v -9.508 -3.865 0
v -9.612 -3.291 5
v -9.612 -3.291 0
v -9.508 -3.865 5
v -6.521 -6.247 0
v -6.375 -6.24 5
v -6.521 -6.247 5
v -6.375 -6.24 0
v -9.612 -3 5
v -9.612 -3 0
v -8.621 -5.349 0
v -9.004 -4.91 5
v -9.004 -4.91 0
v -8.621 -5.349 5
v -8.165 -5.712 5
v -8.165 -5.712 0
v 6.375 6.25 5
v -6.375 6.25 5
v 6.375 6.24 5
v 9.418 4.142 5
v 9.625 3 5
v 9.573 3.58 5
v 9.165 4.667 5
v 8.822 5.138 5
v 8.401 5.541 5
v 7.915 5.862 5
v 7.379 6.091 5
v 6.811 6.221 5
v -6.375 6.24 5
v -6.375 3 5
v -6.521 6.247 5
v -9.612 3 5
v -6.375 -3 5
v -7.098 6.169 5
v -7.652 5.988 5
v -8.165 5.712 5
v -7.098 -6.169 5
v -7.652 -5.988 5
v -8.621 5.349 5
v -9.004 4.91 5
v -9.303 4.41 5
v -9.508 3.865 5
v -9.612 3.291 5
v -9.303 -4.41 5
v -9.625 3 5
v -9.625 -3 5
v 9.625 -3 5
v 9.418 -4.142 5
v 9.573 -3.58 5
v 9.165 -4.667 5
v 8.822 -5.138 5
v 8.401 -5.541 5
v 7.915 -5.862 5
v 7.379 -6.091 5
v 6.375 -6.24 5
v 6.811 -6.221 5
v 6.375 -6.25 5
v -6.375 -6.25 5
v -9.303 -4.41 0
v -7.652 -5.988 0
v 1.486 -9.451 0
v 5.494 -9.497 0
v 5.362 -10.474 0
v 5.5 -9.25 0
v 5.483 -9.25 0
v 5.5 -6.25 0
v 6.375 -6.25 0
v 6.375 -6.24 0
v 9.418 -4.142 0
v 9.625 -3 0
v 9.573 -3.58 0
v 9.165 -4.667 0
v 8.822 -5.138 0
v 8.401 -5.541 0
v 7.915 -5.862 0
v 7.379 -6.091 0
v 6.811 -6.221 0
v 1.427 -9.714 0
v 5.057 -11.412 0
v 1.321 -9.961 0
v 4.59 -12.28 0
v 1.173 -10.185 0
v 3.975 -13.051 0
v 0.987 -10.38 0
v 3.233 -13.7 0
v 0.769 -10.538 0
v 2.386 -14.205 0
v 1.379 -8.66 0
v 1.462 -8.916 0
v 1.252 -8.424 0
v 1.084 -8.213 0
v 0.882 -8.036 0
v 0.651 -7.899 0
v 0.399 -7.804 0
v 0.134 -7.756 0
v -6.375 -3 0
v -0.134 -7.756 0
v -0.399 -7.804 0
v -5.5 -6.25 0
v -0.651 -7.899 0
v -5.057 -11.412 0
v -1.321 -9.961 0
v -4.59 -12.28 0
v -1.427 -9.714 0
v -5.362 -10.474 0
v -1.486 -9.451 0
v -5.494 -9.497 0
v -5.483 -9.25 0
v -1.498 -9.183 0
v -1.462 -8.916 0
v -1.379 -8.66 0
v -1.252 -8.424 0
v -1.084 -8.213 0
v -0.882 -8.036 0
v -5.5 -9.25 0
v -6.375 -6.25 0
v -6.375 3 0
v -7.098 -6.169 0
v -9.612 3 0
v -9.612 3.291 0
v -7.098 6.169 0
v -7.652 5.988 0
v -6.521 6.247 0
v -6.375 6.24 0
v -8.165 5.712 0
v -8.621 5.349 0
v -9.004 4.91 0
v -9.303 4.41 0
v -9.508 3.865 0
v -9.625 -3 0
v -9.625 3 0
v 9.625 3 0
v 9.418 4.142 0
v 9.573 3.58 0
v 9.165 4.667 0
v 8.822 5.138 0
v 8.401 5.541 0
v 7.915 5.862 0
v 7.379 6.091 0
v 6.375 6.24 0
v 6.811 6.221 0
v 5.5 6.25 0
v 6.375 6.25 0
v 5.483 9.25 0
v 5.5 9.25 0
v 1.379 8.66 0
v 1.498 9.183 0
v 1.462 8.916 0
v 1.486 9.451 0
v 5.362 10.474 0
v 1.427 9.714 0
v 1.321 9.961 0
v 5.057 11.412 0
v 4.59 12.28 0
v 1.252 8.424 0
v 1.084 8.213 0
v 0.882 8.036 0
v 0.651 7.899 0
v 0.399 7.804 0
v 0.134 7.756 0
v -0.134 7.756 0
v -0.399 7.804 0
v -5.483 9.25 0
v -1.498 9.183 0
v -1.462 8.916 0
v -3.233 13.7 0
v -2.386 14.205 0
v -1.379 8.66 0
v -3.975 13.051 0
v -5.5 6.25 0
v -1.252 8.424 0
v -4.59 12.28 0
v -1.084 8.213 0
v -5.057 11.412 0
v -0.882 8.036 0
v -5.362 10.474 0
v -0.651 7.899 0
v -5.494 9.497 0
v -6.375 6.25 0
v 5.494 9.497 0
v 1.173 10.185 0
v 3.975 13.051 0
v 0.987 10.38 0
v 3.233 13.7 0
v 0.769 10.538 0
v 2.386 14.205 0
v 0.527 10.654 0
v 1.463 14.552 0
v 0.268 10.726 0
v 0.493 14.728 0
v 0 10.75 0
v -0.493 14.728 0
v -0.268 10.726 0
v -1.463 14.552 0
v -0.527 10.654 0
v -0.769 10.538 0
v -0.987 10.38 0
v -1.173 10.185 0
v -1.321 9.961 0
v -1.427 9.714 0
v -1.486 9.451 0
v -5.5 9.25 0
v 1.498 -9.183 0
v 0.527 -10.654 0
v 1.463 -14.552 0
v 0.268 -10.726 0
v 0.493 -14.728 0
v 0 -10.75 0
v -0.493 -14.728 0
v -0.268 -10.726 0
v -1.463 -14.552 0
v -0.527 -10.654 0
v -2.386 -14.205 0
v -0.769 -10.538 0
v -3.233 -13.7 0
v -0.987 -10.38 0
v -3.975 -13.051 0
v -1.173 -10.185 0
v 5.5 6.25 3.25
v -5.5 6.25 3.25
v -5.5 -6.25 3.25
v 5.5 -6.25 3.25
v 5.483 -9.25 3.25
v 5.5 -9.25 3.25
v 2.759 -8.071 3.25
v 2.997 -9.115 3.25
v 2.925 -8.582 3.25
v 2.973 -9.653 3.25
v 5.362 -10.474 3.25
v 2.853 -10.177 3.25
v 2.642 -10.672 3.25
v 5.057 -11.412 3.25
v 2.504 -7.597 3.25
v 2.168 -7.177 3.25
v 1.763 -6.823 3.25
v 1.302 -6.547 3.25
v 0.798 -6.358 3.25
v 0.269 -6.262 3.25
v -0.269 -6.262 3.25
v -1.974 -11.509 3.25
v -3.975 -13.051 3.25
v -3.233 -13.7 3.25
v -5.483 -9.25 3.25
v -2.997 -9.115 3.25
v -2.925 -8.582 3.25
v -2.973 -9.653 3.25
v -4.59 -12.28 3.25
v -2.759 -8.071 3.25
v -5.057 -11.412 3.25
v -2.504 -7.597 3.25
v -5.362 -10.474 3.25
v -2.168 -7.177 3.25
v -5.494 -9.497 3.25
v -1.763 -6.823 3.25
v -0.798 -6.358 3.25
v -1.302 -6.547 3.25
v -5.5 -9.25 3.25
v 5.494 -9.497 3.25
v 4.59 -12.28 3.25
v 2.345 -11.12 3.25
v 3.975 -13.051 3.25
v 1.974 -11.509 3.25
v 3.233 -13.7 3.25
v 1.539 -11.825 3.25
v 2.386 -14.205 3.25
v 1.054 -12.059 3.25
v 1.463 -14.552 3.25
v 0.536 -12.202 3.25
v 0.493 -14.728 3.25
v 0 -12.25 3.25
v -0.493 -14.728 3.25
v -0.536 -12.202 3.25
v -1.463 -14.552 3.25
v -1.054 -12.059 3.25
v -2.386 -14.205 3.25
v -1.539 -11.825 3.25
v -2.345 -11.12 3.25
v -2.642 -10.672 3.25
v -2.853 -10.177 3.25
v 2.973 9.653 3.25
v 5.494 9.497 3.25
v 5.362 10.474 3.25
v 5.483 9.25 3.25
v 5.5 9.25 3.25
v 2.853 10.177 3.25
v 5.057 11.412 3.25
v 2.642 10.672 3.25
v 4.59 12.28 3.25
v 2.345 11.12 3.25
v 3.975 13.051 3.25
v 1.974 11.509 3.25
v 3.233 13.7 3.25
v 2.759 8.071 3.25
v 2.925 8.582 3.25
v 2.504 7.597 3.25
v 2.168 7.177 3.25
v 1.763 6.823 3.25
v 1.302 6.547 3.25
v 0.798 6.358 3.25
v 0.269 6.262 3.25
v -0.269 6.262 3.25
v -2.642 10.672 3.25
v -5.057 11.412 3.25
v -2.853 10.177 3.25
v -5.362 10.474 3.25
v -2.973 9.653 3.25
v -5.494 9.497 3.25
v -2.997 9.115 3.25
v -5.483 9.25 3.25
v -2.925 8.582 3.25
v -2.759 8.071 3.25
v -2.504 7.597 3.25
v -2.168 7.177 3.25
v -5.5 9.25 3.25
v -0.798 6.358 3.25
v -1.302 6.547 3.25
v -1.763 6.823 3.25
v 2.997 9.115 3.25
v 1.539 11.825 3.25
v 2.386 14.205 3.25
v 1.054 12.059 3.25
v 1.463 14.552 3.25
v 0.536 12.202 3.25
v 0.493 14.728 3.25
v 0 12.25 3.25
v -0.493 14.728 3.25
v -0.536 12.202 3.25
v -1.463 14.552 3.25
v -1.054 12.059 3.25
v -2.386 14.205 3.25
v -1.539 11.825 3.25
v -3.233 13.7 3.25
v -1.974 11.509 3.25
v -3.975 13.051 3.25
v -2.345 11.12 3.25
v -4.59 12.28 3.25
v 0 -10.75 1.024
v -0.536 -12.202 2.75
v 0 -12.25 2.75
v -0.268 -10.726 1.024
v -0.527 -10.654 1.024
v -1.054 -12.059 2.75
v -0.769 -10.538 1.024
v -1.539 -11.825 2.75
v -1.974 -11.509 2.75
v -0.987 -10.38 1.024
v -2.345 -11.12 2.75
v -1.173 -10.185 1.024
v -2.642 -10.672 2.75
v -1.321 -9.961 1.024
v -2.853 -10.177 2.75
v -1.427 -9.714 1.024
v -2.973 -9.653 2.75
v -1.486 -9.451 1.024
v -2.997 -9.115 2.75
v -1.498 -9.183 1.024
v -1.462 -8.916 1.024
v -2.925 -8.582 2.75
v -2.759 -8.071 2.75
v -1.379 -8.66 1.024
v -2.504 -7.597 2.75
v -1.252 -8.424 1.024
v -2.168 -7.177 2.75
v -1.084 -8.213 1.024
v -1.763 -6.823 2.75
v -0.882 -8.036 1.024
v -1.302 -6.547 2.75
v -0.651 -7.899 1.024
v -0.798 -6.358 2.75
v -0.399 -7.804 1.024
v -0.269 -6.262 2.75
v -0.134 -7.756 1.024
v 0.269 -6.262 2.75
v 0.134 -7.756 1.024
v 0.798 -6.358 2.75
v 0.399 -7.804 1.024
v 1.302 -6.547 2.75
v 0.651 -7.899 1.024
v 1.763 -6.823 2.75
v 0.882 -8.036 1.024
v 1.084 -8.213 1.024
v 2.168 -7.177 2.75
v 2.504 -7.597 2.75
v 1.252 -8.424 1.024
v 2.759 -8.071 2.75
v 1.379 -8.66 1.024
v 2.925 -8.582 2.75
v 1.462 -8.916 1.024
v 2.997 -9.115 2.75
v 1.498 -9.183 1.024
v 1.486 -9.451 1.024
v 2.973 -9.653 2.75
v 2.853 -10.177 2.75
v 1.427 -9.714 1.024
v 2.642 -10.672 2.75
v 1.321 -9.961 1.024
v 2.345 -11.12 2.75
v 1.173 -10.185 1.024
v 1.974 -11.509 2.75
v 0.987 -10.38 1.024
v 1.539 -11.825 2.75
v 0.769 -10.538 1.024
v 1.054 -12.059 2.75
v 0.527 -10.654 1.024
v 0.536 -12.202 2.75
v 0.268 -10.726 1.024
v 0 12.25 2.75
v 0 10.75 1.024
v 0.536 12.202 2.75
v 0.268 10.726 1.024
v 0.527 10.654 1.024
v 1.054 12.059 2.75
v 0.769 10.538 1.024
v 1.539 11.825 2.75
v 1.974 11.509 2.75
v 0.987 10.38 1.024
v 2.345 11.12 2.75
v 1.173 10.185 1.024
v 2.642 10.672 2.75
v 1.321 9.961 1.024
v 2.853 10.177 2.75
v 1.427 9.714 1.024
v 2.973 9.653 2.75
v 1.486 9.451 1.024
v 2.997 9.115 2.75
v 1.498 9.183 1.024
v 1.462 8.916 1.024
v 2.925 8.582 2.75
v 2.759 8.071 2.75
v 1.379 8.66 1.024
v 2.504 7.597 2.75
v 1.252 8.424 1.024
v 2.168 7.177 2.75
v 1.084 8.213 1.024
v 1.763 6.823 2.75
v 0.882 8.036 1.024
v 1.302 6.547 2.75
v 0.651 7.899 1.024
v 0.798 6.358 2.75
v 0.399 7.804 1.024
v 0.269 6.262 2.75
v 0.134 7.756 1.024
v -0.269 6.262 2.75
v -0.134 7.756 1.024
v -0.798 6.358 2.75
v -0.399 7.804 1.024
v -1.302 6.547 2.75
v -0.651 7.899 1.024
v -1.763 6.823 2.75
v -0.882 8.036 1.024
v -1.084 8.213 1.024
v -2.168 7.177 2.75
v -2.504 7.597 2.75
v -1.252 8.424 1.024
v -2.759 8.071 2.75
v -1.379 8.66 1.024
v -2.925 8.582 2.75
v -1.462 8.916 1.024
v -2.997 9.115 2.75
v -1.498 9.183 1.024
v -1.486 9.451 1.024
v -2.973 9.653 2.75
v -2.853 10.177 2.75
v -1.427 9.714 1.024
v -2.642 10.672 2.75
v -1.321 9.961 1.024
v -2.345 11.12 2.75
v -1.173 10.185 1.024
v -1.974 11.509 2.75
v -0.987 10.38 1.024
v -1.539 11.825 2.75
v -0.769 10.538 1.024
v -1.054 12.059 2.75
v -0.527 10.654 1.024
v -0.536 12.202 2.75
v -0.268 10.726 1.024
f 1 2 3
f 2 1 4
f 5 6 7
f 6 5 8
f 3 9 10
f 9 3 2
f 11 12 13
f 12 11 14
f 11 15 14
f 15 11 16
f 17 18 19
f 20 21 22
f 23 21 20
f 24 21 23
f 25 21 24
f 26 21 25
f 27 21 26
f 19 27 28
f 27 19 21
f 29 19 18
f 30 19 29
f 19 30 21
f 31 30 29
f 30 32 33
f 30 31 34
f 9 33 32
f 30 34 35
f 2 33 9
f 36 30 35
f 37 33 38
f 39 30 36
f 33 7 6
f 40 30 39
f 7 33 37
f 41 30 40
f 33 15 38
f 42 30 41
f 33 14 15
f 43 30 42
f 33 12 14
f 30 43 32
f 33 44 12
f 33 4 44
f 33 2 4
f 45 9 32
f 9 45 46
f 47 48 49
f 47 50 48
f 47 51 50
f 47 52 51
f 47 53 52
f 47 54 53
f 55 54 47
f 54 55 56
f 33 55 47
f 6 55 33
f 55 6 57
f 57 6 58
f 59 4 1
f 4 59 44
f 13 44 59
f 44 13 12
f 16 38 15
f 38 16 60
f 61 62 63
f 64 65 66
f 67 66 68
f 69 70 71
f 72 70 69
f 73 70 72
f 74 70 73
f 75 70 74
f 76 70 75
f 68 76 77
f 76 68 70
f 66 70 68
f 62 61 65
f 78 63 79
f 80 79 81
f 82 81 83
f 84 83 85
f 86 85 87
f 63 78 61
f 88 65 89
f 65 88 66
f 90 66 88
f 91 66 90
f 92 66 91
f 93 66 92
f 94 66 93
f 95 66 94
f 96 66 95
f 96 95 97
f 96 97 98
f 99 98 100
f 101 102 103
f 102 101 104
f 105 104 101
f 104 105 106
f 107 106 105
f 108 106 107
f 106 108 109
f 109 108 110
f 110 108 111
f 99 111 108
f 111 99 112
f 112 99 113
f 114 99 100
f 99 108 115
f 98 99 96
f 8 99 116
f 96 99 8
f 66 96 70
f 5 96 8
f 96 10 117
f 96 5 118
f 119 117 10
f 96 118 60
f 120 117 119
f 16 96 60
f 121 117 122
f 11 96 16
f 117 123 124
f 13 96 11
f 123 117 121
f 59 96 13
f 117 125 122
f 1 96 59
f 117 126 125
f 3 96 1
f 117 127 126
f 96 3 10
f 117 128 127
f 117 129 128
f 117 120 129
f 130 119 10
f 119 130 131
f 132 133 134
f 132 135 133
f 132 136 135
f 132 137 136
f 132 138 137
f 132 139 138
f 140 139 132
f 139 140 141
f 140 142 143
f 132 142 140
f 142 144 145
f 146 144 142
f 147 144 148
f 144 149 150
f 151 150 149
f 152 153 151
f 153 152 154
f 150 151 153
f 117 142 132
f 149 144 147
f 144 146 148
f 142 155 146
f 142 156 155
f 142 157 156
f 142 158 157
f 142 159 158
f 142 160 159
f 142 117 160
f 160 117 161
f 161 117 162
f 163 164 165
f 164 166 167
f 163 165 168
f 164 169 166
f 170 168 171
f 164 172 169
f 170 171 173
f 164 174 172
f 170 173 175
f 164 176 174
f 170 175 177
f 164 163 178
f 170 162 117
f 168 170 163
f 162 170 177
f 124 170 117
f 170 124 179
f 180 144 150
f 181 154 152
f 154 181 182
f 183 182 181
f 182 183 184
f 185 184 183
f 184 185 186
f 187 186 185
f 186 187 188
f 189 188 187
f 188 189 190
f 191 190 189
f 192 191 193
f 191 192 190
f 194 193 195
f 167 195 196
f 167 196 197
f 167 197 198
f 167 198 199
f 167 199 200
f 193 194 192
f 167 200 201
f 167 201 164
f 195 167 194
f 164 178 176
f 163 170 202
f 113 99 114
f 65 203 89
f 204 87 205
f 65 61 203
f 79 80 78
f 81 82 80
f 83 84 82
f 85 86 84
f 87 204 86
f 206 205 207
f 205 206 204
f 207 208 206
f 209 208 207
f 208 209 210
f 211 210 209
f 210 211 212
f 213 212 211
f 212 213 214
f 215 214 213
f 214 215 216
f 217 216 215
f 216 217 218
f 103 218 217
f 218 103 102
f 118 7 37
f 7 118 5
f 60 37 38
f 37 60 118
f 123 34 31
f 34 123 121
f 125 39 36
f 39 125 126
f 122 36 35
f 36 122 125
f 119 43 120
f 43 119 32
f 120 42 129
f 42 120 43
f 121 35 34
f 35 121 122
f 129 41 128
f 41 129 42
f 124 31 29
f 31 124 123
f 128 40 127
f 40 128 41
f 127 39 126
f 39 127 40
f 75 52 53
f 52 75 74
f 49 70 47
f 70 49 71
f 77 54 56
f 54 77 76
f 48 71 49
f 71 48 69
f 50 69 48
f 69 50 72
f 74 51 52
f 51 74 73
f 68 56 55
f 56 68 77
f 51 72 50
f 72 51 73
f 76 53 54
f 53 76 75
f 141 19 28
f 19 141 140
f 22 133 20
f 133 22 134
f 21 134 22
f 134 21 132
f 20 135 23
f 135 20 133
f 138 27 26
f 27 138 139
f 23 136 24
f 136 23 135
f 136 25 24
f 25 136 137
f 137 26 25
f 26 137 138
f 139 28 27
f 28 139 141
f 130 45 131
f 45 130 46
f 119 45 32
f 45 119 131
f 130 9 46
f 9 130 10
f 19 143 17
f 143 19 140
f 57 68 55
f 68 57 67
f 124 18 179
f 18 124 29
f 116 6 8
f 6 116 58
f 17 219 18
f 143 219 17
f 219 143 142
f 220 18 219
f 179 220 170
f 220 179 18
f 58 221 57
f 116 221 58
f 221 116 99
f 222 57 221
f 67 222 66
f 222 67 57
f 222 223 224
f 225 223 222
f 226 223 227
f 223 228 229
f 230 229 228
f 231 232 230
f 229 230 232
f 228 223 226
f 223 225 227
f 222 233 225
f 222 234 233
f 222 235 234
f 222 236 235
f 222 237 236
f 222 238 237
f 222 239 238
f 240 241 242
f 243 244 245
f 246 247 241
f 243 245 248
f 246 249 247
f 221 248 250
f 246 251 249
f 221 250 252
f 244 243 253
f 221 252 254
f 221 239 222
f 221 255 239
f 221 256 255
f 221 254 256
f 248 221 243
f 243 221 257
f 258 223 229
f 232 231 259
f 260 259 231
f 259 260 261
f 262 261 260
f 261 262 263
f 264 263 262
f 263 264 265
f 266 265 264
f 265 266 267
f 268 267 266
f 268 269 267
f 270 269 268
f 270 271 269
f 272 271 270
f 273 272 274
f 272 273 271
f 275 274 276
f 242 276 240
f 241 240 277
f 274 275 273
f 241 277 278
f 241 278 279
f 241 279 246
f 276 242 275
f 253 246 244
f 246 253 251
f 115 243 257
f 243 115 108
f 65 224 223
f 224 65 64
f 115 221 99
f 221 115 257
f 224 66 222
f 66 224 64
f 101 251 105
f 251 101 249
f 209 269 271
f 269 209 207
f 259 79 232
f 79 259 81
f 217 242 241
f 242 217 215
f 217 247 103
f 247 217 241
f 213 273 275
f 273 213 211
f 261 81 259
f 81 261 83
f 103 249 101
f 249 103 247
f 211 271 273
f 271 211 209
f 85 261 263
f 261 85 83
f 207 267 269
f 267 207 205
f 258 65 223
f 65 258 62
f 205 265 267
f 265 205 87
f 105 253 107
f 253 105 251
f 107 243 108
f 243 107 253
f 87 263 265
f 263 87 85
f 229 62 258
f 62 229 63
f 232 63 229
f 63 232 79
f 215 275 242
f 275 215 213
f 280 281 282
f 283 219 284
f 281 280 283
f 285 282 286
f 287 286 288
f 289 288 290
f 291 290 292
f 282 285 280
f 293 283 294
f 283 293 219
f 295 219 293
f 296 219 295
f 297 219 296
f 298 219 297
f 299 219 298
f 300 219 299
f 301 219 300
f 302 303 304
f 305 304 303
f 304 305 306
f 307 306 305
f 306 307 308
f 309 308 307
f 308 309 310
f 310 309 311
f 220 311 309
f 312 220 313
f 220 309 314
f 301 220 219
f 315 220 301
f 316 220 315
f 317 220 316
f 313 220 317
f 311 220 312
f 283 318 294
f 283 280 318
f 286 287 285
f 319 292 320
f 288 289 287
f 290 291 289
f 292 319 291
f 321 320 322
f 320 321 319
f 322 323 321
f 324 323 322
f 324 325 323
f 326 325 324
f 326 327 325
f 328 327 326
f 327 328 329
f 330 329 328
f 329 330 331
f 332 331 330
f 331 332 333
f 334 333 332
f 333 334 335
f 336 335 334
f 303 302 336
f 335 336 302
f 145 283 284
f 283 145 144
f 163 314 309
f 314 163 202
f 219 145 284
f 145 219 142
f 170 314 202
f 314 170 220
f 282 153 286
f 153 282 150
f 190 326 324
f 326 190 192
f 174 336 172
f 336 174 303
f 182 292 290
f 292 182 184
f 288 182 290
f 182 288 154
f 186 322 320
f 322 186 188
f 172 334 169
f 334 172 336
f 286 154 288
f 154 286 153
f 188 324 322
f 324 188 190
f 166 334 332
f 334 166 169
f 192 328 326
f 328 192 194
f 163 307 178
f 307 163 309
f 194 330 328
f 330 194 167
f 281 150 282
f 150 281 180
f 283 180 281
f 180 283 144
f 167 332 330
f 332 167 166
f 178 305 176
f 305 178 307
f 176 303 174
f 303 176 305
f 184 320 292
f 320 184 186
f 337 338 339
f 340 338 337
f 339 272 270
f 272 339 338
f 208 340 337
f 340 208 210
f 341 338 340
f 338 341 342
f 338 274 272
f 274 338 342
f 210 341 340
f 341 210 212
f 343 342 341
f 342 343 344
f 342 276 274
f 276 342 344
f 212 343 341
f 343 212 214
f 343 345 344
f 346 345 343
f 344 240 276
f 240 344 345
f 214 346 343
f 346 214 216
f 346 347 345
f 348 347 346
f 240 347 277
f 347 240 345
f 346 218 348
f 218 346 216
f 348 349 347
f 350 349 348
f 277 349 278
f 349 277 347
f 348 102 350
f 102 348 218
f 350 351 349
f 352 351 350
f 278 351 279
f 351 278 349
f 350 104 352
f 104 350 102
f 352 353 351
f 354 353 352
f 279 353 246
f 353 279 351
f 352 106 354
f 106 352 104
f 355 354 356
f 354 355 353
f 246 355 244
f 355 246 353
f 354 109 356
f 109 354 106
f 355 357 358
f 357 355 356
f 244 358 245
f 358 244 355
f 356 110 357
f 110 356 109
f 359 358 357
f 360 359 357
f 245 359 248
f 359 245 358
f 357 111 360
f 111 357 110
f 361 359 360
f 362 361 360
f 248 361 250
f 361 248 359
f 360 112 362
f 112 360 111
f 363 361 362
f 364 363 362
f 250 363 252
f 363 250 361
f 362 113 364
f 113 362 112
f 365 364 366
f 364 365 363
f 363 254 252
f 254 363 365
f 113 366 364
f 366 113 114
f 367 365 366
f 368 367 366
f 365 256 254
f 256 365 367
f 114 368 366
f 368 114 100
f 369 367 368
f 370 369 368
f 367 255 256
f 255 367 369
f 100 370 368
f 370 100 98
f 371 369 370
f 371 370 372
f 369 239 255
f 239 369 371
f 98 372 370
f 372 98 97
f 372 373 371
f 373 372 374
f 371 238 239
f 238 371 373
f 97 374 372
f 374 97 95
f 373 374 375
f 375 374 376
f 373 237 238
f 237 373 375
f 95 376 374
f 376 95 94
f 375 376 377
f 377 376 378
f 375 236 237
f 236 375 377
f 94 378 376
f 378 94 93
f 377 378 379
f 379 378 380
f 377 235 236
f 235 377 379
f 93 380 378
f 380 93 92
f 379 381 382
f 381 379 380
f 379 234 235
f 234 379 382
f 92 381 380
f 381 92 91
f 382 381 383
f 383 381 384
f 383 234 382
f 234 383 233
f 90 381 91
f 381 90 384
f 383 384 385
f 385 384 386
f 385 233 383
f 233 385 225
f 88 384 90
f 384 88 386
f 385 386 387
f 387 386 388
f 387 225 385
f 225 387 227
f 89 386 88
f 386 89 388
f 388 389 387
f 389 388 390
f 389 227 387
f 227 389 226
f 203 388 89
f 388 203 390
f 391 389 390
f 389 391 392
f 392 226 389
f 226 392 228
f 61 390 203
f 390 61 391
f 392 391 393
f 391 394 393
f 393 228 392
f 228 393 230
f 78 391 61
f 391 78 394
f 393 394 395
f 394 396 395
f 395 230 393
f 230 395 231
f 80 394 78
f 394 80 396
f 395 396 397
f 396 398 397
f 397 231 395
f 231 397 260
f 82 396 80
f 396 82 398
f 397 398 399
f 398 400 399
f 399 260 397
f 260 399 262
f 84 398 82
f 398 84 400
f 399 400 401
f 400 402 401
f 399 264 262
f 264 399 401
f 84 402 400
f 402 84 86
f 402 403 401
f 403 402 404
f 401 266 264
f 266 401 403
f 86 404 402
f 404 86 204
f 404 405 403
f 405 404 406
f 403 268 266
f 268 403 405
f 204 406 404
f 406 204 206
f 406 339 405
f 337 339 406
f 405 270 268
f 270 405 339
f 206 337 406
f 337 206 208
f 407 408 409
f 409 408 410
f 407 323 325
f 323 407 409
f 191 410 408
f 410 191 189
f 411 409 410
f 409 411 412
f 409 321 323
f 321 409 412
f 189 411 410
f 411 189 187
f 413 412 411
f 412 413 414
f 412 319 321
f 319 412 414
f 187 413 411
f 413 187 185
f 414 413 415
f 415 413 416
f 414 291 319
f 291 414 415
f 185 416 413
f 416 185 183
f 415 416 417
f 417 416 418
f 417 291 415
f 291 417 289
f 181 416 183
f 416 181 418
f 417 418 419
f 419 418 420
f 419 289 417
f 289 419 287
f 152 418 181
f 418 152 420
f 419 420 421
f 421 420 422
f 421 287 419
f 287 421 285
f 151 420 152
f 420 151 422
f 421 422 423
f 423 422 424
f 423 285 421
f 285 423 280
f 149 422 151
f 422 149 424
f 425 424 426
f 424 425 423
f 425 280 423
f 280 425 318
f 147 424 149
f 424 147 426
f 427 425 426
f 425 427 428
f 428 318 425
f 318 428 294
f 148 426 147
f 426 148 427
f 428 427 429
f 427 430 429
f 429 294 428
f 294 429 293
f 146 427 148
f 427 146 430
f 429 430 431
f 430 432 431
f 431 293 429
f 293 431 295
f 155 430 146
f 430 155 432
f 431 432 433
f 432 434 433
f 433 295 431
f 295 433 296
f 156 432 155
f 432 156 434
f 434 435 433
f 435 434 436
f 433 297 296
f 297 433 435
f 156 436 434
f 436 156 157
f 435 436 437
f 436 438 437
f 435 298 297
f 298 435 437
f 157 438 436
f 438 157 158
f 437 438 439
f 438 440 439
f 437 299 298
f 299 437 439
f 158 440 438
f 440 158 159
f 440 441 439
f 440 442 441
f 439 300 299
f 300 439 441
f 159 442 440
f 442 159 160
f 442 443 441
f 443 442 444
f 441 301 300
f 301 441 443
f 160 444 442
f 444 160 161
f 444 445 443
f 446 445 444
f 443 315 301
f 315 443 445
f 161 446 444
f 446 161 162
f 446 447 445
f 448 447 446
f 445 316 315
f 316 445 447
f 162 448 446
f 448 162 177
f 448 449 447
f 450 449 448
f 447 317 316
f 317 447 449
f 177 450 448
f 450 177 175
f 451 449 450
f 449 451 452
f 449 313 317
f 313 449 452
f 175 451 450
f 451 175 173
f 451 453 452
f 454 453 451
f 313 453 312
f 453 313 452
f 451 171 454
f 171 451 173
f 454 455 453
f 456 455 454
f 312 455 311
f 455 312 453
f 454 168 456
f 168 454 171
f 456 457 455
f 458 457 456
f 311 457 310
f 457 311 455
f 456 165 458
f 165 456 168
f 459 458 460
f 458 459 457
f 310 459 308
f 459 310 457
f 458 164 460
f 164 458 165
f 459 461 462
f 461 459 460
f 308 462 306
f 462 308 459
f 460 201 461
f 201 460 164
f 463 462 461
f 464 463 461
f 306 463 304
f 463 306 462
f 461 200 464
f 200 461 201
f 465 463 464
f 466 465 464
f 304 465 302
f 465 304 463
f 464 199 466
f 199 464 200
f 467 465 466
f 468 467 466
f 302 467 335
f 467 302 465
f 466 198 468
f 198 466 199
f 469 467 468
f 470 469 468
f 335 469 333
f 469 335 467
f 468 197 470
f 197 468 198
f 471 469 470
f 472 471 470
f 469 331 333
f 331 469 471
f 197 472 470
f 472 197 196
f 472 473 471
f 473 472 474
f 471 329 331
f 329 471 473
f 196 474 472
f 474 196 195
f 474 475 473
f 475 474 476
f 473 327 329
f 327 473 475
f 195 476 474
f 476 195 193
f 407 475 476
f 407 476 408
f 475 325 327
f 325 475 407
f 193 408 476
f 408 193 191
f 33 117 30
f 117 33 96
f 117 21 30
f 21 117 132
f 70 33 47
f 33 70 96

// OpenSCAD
/*
 * Board Anchor (Parametric), v0.42
 *
 * by Alex Franke (CodeCreations), Dec 2012
 * http://www.theFrankes.com
 * 
 * Licenced under Creative Commons Attribution - Non-Commercial - Share Alike 3.0 
 * 
 * DESCRIPTION: Serves to anchor a board (such as the foot of a laser-cut printer) vertically. 
 * 
 * INSTRUCTIONS:  Print an anchor for each end to be anchored, then install with the board in place
 *   if possible. 
 * 
 * v0.42, Dec 28, 2012: Initial Release.
 * 
 * TODO: 
 *   * None at this time. 
 */


/////////////////////////////////////////////////////////////////////////////
// User-defined values... 
/////////////////////////////////////////////////////////////////////////////

thickness      = 3.25; // Thickness of the printed material 
anchorLength   = 16;   // Length of board edge to "wrap" in the anchor 
anchorHeight   = 5;    // Height of anchor portion  
boardThickness = 6;    // Thickness of the board to anchor

shaftDiameter  = 3;    // The diameter of the through-hole for the screw. #6=3.58, #4=2.78
headDiameter   = 6;    // The diameter of the head of the screw. #6=7.14, #4=5.95
holePadding    = 2.5;  // The width of the material around the hole 
screwAngle     = 82;   // Countersink angle (angle of screw head -- 82 is pretty standard for wood 
                       //   screws.) Other common countersink angles are 60, 90, 100, 110, and 120. 

counterSink    = 0.5;  // Additional distance to inset the countersink

$fn            = 35;   // General curve quality


/////////////////////////////////////////////////////////////////////////////
// The code...
/////////////////////////////////////////////////////////////////////////////

yHeight = (headDiameter/2-shaftDiameter/2)/tan(screwAngle/2); 

difference() {
	union() {
		roundedBox([anchorLength+thickness,boardThickness+thickness*2,anchorHeight],thickness);

		for(y=[-1,1]) 
			translate([0,(boardThickness/2+thickness+headDiameter/2)*y,0]) 
				rotate(y*-90) 
					bracket(headDiameter/2,shaftDiameter/2,headDiameter/2,holePadding,thickness);
	}

	// remove the board 
	translate([-(anchorLength+thickness)/2+thickness,-boardThickness/2,-0.5]) 
		cube([anchorLength+1,boardThickness,anchorHeight+1]);

	// Remove the screw holes 
	for(y=[-1,1]) 
		translate([0,(boardThickness/2+thickness+headDiameter/2)*y,-counterSink]) 
			rotate(y*-90) 
				bracketHole(shaftDiameter/2,headDiameter/2,screwAngle,thickness);
}


/////////////////////////////////////////////////////////////////////////////
// Modules...
/////////////////////////////////////////////////////////////////////////////

module roundedBox(size, radius) {
	union() {
		for(x=[-1,1],y=[-1,1]) 
			translate([x*(size[0]-radius*2)/2,y*(size[1]-radius*2)/2,0]) 
				cylinder(h=size[2],r=radius);

		translate([0,0,size[2]/2]) {
			cube([size[0],size[1]-radius*2,size[2]], center=true);
			cube([size[0]-radius*2, size[1],size[2]], center=true);
		}
	}
}

// length = end to hole center
module bracket(length, holeRadius, headRadius, holePadding, thickness) {
	union() {
		translate([length/2,0,thickness/2]) 	
			cube([length,(headRadius+holePadding)*2,thickness], center=true); 
		cylinder(h=thickness,r=headRadius+holePadding);
	}
}

module bracketHole(holeRadius, headRadius, headAngle, thickness) {
	translate([0,0,thickness]) 
	rotate_extrude(convexity=4) {
		polygon(points=[
			[0,-(thickness+1)-yHeight],
			[holeRadius,-(thickness+1)-yHeight],
			[holeRadius,-yHeight],
			[headRadius,0],
			[headRadius,thickness+1],
			[0,thickness+1]
		]);
	}
}

module wedge(length, height, angle) {

	x = length; 
	y = 2*x*tan(angle/2); 
	z = height;
	x2 = (y/2)/sin(angle/2);

	difference() {
		translate([0,-y/2,0]) 
			cube([x,y,z]);

		for(i=[-1,1])
			rotate([0,0,angle/2*i]) 
				translate([0,-y/2 +y/2*i,-0.5]) 
					cube([x2,y,z+1]);

	}
}
